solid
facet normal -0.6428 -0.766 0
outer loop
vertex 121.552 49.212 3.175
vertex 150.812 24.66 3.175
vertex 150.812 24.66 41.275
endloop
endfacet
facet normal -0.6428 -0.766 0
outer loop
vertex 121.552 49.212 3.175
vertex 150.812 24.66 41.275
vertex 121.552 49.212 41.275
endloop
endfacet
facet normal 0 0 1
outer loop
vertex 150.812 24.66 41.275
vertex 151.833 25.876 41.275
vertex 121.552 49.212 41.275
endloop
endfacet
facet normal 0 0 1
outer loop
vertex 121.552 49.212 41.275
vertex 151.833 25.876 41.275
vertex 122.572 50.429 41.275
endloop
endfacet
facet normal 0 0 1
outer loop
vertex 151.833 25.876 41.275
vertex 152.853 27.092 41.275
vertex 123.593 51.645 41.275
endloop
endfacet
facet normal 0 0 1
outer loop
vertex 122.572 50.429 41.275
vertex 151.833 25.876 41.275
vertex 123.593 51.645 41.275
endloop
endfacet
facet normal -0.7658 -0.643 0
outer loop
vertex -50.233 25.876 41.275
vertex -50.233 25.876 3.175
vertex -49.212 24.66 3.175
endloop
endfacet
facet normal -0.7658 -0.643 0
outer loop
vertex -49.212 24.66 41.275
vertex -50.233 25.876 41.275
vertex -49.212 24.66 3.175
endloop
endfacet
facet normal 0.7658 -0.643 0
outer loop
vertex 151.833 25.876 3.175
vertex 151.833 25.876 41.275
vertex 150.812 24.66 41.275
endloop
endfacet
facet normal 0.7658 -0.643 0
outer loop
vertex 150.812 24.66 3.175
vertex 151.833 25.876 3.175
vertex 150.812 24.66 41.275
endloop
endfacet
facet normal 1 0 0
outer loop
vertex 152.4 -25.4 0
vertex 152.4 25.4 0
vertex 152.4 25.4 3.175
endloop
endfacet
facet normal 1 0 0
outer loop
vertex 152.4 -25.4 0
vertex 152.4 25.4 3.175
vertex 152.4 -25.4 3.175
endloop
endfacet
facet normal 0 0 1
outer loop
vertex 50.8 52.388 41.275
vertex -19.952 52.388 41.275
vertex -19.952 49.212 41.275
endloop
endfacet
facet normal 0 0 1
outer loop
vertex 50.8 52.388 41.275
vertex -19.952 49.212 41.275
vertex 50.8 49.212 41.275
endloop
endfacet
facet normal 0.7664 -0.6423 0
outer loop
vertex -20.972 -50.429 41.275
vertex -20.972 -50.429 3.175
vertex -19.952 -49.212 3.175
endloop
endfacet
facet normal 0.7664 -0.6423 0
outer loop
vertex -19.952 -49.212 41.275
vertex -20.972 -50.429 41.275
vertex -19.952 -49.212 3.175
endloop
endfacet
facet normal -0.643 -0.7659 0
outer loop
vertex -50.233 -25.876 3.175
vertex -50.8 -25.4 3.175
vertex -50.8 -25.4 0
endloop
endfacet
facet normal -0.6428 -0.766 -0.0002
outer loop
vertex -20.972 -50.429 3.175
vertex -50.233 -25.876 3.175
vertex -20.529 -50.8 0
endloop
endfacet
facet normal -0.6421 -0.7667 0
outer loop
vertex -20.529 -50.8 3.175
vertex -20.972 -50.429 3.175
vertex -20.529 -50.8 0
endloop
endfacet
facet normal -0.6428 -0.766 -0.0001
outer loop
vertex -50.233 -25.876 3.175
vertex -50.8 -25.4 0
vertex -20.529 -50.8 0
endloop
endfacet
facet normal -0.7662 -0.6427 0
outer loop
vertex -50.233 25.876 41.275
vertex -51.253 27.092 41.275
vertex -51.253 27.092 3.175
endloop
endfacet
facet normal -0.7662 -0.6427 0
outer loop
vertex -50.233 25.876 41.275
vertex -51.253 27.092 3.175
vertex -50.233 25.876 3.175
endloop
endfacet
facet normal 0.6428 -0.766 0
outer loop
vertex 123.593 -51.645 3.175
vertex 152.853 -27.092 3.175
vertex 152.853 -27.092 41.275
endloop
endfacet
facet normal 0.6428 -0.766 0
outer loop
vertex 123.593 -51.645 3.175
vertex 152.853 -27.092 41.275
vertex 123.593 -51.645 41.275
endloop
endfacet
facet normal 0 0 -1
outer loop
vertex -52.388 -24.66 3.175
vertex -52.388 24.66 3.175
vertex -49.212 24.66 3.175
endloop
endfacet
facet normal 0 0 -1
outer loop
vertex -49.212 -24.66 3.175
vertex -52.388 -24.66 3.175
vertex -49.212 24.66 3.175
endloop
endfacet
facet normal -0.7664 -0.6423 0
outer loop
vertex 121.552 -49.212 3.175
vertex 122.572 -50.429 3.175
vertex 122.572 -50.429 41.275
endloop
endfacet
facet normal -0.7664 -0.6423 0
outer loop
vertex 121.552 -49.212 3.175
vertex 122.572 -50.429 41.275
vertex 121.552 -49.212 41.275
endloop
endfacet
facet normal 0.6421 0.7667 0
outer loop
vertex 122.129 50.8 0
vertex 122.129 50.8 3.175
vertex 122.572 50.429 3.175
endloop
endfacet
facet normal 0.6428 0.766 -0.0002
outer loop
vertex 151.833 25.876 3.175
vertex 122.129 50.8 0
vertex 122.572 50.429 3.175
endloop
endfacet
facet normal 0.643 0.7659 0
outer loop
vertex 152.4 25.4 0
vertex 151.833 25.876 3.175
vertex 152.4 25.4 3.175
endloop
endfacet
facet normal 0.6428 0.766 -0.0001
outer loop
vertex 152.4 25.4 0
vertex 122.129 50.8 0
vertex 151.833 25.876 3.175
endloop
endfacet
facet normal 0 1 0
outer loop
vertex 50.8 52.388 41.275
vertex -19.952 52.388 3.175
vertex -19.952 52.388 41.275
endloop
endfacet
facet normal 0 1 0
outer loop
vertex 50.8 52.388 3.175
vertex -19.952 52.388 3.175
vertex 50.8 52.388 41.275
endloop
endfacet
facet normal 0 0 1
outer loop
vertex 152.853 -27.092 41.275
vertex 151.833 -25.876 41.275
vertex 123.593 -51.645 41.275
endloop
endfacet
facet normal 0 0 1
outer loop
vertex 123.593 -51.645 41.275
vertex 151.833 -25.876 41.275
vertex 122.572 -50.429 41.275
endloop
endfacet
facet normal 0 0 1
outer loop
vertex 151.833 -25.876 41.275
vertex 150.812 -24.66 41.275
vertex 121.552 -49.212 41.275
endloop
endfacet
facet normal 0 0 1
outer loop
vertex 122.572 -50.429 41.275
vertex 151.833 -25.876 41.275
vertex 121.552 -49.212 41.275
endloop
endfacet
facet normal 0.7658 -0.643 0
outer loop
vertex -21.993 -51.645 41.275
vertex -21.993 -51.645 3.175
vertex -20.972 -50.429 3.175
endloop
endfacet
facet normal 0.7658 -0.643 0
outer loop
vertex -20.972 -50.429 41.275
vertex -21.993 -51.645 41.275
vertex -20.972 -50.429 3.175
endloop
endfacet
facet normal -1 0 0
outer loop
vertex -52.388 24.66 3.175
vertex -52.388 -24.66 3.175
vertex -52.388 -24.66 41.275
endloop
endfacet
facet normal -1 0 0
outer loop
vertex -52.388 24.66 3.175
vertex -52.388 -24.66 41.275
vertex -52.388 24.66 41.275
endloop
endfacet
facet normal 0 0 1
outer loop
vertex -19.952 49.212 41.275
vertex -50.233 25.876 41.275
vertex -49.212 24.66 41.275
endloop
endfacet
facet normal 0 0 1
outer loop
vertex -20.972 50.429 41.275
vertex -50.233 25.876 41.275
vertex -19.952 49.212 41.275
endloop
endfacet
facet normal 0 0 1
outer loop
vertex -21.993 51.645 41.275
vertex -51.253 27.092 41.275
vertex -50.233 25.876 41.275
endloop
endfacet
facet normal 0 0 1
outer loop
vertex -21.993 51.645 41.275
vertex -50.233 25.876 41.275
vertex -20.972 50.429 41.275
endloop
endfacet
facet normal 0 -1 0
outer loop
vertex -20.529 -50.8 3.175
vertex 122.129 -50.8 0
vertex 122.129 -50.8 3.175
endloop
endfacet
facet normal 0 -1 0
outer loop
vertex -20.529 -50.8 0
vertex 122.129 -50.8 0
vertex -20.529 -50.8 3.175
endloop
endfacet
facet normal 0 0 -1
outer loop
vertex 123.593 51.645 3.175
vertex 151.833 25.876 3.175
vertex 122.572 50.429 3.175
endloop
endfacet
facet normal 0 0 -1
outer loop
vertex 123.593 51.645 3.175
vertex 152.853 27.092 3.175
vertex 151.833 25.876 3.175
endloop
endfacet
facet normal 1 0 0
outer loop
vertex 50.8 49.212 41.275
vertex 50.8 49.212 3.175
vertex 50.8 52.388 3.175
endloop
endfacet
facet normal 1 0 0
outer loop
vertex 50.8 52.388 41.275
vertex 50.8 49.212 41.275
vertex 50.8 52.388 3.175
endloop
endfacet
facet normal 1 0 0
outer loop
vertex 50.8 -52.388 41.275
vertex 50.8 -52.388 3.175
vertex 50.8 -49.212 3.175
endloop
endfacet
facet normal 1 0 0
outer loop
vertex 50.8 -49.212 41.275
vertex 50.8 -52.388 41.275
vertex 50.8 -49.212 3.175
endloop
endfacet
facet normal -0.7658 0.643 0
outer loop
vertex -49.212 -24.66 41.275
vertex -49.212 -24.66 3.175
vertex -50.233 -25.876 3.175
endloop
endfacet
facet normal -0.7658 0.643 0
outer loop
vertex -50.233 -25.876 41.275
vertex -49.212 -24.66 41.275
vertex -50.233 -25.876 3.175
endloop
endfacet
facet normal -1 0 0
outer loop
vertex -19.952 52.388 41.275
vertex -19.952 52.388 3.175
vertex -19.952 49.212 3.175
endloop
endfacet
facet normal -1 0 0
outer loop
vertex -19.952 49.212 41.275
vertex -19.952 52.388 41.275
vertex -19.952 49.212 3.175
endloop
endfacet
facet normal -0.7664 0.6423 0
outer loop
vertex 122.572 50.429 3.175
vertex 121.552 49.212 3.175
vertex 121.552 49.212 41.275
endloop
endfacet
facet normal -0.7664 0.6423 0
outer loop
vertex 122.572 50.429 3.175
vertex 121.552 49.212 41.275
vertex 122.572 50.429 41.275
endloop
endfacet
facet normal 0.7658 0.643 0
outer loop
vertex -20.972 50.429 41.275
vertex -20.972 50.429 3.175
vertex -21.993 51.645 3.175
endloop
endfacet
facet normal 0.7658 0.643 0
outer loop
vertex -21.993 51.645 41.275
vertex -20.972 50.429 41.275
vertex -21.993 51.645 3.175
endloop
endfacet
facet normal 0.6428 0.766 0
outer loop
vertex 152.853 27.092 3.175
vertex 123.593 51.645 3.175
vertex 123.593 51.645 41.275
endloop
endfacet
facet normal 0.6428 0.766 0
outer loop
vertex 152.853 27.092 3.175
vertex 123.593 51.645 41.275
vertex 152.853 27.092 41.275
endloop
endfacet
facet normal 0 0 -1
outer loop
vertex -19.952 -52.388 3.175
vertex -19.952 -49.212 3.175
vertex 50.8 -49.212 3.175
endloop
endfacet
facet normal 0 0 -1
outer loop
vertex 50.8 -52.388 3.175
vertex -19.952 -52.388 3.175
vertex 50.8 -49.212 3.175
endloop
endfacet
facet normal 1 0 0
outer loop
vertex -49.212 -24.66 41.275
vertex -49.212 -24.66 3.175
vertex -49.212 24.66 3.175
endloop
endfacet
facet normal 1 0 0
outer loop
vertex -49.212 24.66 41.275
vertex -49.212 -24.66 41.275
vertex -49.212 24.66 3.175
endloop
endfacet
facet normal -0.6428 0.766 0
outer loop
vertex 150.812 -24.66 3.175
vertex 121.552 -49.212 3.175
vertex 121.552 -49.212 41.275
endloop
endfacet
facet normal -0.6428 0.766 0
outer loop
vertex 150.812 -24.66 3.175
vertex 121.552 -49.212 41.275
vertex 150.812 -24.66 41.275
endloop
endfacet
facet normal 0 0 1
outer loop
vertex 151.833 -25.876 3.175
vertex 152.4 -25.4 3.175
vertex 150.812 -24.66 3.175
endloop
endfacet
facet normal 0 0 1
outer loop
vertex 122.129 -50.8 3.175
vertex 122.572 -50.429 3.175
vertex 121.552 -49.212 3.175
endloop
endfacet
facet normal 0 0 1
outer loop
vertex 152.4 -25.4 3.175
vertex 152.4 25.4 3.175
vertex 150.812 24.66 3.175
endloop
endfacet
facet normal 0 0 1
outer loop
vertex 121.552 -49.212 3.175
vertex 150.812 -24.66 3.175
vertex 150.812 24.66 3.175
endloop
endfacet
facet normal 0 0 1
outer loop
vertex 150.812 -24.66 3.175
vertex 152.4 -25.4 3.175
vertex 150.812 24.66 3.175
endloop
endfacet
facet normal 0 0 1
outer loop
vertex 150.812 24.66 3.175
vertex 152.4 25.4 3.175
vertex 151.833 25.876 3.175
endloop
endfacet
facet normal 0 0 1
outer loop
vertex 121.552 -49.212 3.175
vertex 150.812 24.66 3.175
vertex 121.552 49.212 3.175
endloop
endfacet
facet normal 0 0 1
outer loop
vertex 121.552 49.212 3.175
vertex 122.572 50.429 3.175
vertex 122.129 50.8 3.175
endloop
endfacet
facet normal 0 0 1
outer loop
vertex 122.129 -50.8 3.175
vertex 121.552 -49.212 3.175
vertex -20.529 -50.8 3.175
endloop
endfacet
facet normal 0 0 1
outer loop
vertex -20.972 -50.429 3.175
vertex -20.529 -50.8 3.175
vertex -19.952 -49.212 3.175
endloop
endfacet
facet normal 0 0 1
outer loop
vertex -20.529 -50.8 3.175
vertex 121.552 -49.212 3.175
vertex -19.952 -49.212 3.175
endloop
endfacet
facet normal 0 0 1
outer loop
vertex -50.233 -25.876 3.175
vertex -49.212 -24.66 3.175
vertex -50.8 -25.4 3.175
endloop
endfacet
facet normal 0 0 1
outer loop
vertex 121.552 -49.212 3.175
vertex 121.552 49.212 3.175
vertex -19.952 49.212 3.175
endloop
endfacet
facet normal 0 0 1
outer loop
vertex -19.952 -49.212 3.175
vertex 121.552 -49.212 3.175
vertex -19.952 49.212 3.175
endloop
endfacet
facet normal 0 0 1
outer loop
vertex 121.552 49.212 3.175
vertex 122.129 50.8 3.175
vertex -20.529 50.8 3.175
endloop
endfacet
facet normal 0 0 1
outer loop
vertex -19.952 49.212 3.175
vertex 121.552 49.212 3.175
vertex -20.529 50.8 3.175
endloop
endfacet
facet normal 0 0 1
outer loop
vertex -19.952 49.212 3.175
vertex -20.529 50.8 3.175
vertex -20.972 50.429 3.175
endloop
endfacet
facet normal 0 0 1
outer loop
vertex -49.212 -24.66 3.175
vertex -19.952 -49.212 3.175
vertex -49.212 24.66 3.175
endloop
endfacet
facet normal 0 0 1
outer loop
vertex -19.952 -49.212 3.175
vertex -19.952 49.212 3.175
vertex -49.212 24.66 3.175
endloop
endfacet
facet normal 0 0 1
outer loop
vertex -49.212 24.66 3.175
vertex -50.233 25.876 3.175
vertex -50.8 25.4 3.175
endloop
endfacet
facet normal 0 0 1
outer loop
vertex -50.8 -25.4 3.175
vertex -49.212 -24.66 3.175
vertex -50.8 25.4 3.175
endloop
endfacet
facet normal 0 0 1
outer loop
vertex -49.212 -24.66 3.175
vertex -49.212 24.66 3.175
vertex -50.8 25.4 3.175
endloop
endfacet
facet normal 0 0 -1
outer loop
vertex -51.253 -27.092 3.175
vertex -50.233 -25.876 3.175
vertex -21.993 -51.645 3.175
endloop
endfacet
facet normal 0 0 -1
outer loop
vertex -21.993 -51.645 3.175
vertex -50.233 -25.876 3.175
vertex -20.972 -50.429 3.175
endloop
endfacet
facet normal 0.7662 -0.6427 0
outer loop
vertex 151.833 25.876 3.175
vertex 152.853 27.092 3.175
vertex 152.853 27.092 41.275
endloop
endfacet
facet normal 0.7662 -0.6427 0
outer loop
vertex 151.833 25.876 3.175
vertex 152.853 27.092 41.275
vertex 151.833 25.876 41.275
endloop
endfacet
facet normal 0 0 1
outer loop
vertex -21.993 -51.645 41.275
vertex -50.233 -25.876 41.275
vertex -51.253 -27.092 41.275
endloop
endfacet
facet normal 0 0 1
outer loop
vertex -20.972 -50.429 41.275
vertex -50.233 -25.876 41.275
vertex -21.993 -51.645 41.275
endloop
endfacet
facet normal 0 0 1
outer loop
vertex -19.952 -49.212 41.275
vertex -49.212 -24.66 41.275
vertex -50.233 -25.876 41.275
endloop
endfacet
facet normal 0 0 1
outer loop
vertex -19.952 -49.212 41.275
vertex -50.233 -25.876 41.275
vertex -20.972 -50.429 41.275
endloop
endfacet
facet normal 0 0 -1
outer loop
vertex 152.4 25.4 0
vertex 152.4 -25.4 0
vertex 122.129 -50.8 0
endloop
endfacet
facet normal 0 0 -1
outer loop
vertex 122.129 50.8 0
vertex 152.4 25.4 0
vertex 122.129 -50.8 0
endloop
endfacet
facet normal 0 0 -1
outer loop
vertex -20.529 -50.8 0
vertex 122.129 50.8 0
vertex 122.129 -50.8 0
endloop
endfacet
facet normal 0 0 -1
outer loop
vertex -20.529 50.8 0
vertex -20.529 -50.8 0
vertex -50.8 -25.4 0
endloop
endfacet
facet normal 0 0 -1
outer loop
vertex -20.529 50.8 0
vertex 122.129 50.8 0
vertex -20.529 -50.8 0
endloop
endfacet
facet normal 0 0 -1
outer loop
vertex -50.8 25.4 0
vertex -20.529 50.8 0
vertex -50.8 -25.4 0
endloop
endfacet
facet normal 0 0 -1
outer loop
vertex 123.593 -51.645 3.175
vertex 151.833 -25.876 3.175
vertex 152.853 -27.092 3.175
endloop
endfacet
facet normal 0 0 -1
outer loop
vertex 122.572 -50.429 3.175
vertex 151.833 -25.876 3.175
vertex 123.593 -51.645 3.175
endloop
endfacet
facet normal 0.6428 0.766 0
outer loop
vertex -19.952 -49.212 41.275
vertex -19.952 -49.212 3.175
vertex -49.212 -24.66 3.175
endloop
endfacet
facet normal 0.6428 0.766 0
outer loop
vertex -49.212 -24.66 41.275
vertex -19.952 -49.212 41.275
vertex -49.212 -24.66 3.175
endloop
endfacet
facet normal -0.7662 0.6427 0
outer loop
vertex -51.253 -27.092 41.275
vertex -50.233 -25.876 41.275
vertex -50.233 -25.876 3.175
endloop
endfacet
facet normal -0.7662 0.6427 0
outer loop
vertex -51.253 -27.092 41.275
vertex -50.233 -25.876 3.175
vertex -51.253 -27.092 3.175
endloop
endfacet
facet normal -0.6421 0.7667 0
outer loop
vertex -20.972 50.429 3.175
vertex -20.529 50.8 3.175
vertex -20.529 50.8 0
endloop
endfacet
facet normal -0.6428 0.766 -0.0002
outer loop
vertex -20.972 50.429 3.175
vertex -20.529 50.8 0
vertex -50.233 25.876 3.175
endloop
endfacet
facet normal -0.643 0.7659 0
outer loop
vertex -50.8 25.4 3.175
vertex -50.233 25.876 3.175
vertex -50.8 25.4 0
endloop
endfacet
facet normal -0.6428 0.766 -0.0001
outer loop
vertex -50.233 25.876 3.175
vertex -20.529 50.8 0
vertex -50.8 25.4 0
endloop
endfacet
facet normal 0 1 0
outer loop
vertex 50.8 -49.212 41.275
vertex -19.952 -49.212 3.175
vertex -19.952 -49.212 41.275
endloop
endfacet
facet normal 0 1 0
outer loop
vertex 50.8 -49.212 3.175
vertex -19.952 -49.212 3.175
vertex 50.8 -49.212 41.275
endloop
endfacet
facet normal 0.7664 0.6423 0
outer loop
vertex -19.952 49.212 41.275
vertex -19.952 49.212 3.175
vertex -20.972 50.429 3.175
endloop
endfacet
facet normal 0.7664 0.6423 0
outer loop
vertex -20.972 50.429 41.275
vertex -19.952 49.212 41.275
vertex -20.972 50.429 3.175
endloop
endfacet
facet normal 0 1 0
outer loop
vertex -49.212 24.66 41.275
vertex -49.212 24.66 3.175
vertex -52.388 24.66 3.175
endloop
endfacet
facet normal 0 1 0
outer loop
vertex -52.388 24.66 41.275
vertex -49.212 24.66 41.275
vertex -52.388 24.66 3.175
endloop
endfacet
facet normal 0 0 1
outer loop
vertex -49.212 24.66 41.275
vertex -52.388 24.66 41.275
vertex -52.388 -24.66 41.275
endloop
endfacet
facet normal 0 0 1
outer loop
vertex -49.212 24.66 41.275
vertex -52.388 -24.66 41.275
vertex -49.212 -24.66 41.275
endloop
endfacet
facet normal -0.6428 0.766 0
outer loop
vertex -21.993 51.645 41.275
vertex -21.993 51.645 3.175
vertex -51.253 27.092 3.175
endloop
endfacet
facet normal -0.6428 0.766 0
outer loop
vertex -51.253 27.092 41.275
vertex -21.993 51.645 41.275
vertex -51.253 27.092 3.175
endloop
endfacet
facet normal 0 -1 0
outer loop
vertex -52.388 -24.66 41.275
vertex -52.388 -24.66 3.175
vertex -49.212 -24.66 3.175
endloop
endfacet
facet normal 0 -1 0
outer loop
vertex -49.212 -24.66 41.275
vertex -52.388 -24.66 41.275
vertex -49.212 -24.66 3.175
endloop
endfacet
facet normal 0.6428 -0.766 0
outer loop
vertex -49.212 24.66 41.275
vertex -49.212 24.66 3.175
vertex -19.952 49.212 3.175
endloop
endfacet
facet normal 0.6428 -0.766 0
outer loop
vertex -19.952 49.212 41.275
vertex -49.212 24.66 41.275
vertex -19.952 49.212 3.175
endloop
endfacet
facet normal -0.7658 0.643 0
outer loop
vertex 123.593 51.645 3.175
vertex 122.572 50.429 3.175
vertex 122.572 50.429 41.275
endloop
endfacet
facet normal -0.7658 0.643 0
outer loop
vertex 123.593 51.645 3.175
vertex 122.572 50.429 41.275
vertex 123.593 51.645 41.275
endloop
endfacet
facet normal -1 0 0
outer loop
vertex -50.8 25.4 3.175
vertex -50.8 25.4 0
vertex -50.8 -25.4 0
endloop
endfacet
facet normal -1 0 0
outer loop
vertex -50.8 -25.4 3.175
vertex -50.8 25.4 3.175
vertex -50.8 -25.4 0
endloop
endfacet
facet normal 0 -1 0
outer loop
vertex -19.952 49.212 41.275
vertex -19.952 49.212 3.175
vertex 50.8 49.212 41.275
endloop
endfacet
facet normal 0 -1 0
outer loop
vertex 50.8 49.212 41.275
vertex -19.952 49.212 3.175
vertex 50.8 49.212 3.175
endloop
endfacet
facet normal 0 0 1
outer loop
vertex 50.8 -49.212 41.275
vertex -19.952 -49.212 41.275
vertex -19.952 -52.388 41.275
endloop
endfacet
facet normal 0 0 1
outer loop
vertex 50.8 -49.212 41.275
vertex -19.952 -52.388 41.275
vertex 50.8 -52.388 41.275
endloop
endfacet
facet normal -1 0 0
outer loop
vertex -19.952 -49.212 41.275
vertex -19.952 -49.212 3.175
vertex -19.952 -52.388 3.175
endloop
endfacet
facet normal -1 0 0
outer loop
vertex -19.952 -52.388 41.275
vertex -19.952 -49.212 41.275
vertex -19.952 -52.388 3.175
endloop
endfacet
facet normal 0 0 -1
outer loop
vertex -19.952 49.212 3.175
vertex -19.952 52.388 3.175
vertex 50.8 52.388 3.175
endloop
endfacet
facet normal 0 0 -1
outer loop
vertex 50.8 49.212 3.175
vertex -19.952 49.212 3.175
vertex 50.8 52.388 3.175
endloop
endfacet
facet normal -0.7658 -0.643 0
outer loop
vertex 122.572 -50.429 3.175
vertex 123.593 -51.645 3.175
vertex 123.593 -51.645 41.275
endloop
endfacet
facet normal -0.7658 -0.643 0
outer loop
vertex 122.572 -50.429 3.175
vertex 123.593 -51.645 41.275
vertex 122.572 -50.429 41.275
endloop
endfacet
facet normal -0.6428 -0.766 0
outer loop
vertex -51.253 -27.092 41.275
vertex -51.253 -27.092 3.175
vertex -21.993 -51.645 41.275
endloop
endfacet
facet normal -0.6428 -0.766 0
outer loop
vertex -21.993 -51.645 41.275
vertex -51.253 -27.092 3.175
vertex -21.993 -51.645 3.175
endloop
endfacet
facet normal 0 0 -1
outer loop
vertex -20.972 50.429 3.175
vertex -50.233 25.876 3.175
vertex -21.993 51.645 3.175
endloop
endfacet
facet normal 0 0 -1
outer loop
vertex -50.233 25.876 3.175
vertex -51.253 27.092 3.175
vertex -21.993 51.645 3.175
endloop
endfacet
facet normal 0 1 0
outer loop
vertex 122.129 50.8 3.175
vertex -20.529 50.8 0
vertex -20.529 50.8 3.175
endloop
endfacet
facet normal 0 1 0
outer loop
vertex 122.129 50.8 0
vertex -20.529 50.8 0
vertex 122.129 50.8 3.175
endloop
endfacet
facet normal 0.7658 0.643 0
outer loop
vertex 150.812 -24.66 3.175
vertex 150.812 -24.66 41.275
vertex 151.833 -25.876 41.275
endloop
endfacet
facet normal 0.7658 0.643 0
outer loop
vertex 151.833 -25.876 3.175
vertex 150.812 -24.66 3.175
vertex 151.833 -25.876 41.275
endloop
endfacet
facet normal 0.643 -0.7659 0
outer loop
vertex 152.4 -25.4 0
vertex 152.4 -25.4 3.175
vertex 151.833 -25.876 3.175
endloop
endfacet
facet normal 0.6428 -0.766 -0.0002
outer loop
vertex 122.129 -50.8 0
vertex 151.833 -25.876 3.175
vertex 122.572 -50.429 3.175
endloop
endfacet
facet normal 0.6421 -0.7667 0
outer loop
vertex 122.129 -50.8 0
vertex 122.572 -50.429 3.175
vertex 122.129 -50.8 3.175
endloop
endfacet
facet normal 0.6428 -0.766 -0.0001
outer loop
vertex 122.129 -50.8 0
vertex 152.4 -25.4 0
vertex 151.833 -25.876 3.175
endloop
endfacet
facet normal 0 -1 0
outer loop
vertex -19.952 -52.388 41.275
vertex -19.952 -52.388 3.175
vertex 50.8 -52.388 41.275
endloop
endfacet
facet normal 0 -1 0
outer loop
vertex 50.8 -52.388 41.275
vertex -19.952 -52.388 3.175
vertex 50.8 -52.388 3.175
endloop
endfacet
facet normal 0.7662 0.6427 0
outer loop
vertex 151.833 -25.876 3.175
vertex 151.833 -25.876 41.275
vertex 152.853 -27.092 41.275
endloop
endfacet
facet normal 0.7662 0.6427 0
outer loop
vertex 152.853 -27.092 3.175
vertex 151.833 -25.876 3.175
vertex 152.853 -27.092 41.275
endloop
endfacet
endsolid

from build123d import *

# Parameters (mm, degrees)
F1_DEPTH = 3.175
F3_DEPTH = 38.1
F2_W     = 1.5875
F2_H     = 49.319474
F2_W_2   = 70.751656
F2_H_2   = 1.5875
F5_DEPTH = 38.1


with BuildPart() as f1:
    # F0 (on Top) → F1 (new body)
    with BuildSketch(Plane.XY):
        Polygon((50.8, 50.8), (-20.529459, 50.8), (-50.8, 25.4), (-50.8, -25.4), (-20.529459, -50.8), (50.8, -50.8), align=None)
    extrude(amount=F1_DEPTH)

    # F2 (on face) → F3 (join)
    with BuildSketch(Plane.XY.offset(3.175)):
        Polygon((-19.951656, -49.2125), (-49.2125, -24.659737), (-50.232925, -25.875832), (-20.972081, -50.428596), align=None)
        Polygon((-20.972081, -50.428596), (-50.232925, -25.875832), (-51.253351, -27.091928), (-21.992507, -51.644691), align=None)
        Polygon((-50.232925, 25.875832), (-20.972081, 50.428596), (-21.992507, 51.644691), (-51.253351, 27.091928), align=None)
        Polygon((-49.2125, 24.659737), (-19.951656, 49.2125), (-20.972081, 50.428596), (-50.232925, 25.875832), align=None)
    extrude(amount=F3_DEPTH)

    # F4: F1 across face


with BuildPart() as f1_1:
    add(f1.part)
    add(f1.part.mirror(Plane(origin=(50.8, 0, 1.5875), x_dir=(0, 1, 0), z_dir=(1, 0, 0))))


with BuildPart() as f5:
    # F2 (on face) → F5 (new body)
    with BuildSketch(Plane.XY.offset(3.175)):
        with Locations((-50.00625, 0)):
            Rectangle(F2_W, F2_H)
        with Locations((-51.59375, 0)):
            Rectangle(F2_W, F2_H)
        with Locations((15.424172, 51.59375)):
            Rectangle(F2_W_2, F2_H_2)
        with Locations((15.424172, 50.00625)):
            Rectangle(F2_W_2, F2_H_2)
        with Locations((15.424172, -50.00625)):
            Rectangle(F2_W_2, F2_H_2)
        with Locations((15.424172, -51.59375)):
            Rectangle(F2_W_2, F2_H_2)
    extrude(amount=F5_DEPTH)


solid = Compound([f1_1.part, f5.part])
